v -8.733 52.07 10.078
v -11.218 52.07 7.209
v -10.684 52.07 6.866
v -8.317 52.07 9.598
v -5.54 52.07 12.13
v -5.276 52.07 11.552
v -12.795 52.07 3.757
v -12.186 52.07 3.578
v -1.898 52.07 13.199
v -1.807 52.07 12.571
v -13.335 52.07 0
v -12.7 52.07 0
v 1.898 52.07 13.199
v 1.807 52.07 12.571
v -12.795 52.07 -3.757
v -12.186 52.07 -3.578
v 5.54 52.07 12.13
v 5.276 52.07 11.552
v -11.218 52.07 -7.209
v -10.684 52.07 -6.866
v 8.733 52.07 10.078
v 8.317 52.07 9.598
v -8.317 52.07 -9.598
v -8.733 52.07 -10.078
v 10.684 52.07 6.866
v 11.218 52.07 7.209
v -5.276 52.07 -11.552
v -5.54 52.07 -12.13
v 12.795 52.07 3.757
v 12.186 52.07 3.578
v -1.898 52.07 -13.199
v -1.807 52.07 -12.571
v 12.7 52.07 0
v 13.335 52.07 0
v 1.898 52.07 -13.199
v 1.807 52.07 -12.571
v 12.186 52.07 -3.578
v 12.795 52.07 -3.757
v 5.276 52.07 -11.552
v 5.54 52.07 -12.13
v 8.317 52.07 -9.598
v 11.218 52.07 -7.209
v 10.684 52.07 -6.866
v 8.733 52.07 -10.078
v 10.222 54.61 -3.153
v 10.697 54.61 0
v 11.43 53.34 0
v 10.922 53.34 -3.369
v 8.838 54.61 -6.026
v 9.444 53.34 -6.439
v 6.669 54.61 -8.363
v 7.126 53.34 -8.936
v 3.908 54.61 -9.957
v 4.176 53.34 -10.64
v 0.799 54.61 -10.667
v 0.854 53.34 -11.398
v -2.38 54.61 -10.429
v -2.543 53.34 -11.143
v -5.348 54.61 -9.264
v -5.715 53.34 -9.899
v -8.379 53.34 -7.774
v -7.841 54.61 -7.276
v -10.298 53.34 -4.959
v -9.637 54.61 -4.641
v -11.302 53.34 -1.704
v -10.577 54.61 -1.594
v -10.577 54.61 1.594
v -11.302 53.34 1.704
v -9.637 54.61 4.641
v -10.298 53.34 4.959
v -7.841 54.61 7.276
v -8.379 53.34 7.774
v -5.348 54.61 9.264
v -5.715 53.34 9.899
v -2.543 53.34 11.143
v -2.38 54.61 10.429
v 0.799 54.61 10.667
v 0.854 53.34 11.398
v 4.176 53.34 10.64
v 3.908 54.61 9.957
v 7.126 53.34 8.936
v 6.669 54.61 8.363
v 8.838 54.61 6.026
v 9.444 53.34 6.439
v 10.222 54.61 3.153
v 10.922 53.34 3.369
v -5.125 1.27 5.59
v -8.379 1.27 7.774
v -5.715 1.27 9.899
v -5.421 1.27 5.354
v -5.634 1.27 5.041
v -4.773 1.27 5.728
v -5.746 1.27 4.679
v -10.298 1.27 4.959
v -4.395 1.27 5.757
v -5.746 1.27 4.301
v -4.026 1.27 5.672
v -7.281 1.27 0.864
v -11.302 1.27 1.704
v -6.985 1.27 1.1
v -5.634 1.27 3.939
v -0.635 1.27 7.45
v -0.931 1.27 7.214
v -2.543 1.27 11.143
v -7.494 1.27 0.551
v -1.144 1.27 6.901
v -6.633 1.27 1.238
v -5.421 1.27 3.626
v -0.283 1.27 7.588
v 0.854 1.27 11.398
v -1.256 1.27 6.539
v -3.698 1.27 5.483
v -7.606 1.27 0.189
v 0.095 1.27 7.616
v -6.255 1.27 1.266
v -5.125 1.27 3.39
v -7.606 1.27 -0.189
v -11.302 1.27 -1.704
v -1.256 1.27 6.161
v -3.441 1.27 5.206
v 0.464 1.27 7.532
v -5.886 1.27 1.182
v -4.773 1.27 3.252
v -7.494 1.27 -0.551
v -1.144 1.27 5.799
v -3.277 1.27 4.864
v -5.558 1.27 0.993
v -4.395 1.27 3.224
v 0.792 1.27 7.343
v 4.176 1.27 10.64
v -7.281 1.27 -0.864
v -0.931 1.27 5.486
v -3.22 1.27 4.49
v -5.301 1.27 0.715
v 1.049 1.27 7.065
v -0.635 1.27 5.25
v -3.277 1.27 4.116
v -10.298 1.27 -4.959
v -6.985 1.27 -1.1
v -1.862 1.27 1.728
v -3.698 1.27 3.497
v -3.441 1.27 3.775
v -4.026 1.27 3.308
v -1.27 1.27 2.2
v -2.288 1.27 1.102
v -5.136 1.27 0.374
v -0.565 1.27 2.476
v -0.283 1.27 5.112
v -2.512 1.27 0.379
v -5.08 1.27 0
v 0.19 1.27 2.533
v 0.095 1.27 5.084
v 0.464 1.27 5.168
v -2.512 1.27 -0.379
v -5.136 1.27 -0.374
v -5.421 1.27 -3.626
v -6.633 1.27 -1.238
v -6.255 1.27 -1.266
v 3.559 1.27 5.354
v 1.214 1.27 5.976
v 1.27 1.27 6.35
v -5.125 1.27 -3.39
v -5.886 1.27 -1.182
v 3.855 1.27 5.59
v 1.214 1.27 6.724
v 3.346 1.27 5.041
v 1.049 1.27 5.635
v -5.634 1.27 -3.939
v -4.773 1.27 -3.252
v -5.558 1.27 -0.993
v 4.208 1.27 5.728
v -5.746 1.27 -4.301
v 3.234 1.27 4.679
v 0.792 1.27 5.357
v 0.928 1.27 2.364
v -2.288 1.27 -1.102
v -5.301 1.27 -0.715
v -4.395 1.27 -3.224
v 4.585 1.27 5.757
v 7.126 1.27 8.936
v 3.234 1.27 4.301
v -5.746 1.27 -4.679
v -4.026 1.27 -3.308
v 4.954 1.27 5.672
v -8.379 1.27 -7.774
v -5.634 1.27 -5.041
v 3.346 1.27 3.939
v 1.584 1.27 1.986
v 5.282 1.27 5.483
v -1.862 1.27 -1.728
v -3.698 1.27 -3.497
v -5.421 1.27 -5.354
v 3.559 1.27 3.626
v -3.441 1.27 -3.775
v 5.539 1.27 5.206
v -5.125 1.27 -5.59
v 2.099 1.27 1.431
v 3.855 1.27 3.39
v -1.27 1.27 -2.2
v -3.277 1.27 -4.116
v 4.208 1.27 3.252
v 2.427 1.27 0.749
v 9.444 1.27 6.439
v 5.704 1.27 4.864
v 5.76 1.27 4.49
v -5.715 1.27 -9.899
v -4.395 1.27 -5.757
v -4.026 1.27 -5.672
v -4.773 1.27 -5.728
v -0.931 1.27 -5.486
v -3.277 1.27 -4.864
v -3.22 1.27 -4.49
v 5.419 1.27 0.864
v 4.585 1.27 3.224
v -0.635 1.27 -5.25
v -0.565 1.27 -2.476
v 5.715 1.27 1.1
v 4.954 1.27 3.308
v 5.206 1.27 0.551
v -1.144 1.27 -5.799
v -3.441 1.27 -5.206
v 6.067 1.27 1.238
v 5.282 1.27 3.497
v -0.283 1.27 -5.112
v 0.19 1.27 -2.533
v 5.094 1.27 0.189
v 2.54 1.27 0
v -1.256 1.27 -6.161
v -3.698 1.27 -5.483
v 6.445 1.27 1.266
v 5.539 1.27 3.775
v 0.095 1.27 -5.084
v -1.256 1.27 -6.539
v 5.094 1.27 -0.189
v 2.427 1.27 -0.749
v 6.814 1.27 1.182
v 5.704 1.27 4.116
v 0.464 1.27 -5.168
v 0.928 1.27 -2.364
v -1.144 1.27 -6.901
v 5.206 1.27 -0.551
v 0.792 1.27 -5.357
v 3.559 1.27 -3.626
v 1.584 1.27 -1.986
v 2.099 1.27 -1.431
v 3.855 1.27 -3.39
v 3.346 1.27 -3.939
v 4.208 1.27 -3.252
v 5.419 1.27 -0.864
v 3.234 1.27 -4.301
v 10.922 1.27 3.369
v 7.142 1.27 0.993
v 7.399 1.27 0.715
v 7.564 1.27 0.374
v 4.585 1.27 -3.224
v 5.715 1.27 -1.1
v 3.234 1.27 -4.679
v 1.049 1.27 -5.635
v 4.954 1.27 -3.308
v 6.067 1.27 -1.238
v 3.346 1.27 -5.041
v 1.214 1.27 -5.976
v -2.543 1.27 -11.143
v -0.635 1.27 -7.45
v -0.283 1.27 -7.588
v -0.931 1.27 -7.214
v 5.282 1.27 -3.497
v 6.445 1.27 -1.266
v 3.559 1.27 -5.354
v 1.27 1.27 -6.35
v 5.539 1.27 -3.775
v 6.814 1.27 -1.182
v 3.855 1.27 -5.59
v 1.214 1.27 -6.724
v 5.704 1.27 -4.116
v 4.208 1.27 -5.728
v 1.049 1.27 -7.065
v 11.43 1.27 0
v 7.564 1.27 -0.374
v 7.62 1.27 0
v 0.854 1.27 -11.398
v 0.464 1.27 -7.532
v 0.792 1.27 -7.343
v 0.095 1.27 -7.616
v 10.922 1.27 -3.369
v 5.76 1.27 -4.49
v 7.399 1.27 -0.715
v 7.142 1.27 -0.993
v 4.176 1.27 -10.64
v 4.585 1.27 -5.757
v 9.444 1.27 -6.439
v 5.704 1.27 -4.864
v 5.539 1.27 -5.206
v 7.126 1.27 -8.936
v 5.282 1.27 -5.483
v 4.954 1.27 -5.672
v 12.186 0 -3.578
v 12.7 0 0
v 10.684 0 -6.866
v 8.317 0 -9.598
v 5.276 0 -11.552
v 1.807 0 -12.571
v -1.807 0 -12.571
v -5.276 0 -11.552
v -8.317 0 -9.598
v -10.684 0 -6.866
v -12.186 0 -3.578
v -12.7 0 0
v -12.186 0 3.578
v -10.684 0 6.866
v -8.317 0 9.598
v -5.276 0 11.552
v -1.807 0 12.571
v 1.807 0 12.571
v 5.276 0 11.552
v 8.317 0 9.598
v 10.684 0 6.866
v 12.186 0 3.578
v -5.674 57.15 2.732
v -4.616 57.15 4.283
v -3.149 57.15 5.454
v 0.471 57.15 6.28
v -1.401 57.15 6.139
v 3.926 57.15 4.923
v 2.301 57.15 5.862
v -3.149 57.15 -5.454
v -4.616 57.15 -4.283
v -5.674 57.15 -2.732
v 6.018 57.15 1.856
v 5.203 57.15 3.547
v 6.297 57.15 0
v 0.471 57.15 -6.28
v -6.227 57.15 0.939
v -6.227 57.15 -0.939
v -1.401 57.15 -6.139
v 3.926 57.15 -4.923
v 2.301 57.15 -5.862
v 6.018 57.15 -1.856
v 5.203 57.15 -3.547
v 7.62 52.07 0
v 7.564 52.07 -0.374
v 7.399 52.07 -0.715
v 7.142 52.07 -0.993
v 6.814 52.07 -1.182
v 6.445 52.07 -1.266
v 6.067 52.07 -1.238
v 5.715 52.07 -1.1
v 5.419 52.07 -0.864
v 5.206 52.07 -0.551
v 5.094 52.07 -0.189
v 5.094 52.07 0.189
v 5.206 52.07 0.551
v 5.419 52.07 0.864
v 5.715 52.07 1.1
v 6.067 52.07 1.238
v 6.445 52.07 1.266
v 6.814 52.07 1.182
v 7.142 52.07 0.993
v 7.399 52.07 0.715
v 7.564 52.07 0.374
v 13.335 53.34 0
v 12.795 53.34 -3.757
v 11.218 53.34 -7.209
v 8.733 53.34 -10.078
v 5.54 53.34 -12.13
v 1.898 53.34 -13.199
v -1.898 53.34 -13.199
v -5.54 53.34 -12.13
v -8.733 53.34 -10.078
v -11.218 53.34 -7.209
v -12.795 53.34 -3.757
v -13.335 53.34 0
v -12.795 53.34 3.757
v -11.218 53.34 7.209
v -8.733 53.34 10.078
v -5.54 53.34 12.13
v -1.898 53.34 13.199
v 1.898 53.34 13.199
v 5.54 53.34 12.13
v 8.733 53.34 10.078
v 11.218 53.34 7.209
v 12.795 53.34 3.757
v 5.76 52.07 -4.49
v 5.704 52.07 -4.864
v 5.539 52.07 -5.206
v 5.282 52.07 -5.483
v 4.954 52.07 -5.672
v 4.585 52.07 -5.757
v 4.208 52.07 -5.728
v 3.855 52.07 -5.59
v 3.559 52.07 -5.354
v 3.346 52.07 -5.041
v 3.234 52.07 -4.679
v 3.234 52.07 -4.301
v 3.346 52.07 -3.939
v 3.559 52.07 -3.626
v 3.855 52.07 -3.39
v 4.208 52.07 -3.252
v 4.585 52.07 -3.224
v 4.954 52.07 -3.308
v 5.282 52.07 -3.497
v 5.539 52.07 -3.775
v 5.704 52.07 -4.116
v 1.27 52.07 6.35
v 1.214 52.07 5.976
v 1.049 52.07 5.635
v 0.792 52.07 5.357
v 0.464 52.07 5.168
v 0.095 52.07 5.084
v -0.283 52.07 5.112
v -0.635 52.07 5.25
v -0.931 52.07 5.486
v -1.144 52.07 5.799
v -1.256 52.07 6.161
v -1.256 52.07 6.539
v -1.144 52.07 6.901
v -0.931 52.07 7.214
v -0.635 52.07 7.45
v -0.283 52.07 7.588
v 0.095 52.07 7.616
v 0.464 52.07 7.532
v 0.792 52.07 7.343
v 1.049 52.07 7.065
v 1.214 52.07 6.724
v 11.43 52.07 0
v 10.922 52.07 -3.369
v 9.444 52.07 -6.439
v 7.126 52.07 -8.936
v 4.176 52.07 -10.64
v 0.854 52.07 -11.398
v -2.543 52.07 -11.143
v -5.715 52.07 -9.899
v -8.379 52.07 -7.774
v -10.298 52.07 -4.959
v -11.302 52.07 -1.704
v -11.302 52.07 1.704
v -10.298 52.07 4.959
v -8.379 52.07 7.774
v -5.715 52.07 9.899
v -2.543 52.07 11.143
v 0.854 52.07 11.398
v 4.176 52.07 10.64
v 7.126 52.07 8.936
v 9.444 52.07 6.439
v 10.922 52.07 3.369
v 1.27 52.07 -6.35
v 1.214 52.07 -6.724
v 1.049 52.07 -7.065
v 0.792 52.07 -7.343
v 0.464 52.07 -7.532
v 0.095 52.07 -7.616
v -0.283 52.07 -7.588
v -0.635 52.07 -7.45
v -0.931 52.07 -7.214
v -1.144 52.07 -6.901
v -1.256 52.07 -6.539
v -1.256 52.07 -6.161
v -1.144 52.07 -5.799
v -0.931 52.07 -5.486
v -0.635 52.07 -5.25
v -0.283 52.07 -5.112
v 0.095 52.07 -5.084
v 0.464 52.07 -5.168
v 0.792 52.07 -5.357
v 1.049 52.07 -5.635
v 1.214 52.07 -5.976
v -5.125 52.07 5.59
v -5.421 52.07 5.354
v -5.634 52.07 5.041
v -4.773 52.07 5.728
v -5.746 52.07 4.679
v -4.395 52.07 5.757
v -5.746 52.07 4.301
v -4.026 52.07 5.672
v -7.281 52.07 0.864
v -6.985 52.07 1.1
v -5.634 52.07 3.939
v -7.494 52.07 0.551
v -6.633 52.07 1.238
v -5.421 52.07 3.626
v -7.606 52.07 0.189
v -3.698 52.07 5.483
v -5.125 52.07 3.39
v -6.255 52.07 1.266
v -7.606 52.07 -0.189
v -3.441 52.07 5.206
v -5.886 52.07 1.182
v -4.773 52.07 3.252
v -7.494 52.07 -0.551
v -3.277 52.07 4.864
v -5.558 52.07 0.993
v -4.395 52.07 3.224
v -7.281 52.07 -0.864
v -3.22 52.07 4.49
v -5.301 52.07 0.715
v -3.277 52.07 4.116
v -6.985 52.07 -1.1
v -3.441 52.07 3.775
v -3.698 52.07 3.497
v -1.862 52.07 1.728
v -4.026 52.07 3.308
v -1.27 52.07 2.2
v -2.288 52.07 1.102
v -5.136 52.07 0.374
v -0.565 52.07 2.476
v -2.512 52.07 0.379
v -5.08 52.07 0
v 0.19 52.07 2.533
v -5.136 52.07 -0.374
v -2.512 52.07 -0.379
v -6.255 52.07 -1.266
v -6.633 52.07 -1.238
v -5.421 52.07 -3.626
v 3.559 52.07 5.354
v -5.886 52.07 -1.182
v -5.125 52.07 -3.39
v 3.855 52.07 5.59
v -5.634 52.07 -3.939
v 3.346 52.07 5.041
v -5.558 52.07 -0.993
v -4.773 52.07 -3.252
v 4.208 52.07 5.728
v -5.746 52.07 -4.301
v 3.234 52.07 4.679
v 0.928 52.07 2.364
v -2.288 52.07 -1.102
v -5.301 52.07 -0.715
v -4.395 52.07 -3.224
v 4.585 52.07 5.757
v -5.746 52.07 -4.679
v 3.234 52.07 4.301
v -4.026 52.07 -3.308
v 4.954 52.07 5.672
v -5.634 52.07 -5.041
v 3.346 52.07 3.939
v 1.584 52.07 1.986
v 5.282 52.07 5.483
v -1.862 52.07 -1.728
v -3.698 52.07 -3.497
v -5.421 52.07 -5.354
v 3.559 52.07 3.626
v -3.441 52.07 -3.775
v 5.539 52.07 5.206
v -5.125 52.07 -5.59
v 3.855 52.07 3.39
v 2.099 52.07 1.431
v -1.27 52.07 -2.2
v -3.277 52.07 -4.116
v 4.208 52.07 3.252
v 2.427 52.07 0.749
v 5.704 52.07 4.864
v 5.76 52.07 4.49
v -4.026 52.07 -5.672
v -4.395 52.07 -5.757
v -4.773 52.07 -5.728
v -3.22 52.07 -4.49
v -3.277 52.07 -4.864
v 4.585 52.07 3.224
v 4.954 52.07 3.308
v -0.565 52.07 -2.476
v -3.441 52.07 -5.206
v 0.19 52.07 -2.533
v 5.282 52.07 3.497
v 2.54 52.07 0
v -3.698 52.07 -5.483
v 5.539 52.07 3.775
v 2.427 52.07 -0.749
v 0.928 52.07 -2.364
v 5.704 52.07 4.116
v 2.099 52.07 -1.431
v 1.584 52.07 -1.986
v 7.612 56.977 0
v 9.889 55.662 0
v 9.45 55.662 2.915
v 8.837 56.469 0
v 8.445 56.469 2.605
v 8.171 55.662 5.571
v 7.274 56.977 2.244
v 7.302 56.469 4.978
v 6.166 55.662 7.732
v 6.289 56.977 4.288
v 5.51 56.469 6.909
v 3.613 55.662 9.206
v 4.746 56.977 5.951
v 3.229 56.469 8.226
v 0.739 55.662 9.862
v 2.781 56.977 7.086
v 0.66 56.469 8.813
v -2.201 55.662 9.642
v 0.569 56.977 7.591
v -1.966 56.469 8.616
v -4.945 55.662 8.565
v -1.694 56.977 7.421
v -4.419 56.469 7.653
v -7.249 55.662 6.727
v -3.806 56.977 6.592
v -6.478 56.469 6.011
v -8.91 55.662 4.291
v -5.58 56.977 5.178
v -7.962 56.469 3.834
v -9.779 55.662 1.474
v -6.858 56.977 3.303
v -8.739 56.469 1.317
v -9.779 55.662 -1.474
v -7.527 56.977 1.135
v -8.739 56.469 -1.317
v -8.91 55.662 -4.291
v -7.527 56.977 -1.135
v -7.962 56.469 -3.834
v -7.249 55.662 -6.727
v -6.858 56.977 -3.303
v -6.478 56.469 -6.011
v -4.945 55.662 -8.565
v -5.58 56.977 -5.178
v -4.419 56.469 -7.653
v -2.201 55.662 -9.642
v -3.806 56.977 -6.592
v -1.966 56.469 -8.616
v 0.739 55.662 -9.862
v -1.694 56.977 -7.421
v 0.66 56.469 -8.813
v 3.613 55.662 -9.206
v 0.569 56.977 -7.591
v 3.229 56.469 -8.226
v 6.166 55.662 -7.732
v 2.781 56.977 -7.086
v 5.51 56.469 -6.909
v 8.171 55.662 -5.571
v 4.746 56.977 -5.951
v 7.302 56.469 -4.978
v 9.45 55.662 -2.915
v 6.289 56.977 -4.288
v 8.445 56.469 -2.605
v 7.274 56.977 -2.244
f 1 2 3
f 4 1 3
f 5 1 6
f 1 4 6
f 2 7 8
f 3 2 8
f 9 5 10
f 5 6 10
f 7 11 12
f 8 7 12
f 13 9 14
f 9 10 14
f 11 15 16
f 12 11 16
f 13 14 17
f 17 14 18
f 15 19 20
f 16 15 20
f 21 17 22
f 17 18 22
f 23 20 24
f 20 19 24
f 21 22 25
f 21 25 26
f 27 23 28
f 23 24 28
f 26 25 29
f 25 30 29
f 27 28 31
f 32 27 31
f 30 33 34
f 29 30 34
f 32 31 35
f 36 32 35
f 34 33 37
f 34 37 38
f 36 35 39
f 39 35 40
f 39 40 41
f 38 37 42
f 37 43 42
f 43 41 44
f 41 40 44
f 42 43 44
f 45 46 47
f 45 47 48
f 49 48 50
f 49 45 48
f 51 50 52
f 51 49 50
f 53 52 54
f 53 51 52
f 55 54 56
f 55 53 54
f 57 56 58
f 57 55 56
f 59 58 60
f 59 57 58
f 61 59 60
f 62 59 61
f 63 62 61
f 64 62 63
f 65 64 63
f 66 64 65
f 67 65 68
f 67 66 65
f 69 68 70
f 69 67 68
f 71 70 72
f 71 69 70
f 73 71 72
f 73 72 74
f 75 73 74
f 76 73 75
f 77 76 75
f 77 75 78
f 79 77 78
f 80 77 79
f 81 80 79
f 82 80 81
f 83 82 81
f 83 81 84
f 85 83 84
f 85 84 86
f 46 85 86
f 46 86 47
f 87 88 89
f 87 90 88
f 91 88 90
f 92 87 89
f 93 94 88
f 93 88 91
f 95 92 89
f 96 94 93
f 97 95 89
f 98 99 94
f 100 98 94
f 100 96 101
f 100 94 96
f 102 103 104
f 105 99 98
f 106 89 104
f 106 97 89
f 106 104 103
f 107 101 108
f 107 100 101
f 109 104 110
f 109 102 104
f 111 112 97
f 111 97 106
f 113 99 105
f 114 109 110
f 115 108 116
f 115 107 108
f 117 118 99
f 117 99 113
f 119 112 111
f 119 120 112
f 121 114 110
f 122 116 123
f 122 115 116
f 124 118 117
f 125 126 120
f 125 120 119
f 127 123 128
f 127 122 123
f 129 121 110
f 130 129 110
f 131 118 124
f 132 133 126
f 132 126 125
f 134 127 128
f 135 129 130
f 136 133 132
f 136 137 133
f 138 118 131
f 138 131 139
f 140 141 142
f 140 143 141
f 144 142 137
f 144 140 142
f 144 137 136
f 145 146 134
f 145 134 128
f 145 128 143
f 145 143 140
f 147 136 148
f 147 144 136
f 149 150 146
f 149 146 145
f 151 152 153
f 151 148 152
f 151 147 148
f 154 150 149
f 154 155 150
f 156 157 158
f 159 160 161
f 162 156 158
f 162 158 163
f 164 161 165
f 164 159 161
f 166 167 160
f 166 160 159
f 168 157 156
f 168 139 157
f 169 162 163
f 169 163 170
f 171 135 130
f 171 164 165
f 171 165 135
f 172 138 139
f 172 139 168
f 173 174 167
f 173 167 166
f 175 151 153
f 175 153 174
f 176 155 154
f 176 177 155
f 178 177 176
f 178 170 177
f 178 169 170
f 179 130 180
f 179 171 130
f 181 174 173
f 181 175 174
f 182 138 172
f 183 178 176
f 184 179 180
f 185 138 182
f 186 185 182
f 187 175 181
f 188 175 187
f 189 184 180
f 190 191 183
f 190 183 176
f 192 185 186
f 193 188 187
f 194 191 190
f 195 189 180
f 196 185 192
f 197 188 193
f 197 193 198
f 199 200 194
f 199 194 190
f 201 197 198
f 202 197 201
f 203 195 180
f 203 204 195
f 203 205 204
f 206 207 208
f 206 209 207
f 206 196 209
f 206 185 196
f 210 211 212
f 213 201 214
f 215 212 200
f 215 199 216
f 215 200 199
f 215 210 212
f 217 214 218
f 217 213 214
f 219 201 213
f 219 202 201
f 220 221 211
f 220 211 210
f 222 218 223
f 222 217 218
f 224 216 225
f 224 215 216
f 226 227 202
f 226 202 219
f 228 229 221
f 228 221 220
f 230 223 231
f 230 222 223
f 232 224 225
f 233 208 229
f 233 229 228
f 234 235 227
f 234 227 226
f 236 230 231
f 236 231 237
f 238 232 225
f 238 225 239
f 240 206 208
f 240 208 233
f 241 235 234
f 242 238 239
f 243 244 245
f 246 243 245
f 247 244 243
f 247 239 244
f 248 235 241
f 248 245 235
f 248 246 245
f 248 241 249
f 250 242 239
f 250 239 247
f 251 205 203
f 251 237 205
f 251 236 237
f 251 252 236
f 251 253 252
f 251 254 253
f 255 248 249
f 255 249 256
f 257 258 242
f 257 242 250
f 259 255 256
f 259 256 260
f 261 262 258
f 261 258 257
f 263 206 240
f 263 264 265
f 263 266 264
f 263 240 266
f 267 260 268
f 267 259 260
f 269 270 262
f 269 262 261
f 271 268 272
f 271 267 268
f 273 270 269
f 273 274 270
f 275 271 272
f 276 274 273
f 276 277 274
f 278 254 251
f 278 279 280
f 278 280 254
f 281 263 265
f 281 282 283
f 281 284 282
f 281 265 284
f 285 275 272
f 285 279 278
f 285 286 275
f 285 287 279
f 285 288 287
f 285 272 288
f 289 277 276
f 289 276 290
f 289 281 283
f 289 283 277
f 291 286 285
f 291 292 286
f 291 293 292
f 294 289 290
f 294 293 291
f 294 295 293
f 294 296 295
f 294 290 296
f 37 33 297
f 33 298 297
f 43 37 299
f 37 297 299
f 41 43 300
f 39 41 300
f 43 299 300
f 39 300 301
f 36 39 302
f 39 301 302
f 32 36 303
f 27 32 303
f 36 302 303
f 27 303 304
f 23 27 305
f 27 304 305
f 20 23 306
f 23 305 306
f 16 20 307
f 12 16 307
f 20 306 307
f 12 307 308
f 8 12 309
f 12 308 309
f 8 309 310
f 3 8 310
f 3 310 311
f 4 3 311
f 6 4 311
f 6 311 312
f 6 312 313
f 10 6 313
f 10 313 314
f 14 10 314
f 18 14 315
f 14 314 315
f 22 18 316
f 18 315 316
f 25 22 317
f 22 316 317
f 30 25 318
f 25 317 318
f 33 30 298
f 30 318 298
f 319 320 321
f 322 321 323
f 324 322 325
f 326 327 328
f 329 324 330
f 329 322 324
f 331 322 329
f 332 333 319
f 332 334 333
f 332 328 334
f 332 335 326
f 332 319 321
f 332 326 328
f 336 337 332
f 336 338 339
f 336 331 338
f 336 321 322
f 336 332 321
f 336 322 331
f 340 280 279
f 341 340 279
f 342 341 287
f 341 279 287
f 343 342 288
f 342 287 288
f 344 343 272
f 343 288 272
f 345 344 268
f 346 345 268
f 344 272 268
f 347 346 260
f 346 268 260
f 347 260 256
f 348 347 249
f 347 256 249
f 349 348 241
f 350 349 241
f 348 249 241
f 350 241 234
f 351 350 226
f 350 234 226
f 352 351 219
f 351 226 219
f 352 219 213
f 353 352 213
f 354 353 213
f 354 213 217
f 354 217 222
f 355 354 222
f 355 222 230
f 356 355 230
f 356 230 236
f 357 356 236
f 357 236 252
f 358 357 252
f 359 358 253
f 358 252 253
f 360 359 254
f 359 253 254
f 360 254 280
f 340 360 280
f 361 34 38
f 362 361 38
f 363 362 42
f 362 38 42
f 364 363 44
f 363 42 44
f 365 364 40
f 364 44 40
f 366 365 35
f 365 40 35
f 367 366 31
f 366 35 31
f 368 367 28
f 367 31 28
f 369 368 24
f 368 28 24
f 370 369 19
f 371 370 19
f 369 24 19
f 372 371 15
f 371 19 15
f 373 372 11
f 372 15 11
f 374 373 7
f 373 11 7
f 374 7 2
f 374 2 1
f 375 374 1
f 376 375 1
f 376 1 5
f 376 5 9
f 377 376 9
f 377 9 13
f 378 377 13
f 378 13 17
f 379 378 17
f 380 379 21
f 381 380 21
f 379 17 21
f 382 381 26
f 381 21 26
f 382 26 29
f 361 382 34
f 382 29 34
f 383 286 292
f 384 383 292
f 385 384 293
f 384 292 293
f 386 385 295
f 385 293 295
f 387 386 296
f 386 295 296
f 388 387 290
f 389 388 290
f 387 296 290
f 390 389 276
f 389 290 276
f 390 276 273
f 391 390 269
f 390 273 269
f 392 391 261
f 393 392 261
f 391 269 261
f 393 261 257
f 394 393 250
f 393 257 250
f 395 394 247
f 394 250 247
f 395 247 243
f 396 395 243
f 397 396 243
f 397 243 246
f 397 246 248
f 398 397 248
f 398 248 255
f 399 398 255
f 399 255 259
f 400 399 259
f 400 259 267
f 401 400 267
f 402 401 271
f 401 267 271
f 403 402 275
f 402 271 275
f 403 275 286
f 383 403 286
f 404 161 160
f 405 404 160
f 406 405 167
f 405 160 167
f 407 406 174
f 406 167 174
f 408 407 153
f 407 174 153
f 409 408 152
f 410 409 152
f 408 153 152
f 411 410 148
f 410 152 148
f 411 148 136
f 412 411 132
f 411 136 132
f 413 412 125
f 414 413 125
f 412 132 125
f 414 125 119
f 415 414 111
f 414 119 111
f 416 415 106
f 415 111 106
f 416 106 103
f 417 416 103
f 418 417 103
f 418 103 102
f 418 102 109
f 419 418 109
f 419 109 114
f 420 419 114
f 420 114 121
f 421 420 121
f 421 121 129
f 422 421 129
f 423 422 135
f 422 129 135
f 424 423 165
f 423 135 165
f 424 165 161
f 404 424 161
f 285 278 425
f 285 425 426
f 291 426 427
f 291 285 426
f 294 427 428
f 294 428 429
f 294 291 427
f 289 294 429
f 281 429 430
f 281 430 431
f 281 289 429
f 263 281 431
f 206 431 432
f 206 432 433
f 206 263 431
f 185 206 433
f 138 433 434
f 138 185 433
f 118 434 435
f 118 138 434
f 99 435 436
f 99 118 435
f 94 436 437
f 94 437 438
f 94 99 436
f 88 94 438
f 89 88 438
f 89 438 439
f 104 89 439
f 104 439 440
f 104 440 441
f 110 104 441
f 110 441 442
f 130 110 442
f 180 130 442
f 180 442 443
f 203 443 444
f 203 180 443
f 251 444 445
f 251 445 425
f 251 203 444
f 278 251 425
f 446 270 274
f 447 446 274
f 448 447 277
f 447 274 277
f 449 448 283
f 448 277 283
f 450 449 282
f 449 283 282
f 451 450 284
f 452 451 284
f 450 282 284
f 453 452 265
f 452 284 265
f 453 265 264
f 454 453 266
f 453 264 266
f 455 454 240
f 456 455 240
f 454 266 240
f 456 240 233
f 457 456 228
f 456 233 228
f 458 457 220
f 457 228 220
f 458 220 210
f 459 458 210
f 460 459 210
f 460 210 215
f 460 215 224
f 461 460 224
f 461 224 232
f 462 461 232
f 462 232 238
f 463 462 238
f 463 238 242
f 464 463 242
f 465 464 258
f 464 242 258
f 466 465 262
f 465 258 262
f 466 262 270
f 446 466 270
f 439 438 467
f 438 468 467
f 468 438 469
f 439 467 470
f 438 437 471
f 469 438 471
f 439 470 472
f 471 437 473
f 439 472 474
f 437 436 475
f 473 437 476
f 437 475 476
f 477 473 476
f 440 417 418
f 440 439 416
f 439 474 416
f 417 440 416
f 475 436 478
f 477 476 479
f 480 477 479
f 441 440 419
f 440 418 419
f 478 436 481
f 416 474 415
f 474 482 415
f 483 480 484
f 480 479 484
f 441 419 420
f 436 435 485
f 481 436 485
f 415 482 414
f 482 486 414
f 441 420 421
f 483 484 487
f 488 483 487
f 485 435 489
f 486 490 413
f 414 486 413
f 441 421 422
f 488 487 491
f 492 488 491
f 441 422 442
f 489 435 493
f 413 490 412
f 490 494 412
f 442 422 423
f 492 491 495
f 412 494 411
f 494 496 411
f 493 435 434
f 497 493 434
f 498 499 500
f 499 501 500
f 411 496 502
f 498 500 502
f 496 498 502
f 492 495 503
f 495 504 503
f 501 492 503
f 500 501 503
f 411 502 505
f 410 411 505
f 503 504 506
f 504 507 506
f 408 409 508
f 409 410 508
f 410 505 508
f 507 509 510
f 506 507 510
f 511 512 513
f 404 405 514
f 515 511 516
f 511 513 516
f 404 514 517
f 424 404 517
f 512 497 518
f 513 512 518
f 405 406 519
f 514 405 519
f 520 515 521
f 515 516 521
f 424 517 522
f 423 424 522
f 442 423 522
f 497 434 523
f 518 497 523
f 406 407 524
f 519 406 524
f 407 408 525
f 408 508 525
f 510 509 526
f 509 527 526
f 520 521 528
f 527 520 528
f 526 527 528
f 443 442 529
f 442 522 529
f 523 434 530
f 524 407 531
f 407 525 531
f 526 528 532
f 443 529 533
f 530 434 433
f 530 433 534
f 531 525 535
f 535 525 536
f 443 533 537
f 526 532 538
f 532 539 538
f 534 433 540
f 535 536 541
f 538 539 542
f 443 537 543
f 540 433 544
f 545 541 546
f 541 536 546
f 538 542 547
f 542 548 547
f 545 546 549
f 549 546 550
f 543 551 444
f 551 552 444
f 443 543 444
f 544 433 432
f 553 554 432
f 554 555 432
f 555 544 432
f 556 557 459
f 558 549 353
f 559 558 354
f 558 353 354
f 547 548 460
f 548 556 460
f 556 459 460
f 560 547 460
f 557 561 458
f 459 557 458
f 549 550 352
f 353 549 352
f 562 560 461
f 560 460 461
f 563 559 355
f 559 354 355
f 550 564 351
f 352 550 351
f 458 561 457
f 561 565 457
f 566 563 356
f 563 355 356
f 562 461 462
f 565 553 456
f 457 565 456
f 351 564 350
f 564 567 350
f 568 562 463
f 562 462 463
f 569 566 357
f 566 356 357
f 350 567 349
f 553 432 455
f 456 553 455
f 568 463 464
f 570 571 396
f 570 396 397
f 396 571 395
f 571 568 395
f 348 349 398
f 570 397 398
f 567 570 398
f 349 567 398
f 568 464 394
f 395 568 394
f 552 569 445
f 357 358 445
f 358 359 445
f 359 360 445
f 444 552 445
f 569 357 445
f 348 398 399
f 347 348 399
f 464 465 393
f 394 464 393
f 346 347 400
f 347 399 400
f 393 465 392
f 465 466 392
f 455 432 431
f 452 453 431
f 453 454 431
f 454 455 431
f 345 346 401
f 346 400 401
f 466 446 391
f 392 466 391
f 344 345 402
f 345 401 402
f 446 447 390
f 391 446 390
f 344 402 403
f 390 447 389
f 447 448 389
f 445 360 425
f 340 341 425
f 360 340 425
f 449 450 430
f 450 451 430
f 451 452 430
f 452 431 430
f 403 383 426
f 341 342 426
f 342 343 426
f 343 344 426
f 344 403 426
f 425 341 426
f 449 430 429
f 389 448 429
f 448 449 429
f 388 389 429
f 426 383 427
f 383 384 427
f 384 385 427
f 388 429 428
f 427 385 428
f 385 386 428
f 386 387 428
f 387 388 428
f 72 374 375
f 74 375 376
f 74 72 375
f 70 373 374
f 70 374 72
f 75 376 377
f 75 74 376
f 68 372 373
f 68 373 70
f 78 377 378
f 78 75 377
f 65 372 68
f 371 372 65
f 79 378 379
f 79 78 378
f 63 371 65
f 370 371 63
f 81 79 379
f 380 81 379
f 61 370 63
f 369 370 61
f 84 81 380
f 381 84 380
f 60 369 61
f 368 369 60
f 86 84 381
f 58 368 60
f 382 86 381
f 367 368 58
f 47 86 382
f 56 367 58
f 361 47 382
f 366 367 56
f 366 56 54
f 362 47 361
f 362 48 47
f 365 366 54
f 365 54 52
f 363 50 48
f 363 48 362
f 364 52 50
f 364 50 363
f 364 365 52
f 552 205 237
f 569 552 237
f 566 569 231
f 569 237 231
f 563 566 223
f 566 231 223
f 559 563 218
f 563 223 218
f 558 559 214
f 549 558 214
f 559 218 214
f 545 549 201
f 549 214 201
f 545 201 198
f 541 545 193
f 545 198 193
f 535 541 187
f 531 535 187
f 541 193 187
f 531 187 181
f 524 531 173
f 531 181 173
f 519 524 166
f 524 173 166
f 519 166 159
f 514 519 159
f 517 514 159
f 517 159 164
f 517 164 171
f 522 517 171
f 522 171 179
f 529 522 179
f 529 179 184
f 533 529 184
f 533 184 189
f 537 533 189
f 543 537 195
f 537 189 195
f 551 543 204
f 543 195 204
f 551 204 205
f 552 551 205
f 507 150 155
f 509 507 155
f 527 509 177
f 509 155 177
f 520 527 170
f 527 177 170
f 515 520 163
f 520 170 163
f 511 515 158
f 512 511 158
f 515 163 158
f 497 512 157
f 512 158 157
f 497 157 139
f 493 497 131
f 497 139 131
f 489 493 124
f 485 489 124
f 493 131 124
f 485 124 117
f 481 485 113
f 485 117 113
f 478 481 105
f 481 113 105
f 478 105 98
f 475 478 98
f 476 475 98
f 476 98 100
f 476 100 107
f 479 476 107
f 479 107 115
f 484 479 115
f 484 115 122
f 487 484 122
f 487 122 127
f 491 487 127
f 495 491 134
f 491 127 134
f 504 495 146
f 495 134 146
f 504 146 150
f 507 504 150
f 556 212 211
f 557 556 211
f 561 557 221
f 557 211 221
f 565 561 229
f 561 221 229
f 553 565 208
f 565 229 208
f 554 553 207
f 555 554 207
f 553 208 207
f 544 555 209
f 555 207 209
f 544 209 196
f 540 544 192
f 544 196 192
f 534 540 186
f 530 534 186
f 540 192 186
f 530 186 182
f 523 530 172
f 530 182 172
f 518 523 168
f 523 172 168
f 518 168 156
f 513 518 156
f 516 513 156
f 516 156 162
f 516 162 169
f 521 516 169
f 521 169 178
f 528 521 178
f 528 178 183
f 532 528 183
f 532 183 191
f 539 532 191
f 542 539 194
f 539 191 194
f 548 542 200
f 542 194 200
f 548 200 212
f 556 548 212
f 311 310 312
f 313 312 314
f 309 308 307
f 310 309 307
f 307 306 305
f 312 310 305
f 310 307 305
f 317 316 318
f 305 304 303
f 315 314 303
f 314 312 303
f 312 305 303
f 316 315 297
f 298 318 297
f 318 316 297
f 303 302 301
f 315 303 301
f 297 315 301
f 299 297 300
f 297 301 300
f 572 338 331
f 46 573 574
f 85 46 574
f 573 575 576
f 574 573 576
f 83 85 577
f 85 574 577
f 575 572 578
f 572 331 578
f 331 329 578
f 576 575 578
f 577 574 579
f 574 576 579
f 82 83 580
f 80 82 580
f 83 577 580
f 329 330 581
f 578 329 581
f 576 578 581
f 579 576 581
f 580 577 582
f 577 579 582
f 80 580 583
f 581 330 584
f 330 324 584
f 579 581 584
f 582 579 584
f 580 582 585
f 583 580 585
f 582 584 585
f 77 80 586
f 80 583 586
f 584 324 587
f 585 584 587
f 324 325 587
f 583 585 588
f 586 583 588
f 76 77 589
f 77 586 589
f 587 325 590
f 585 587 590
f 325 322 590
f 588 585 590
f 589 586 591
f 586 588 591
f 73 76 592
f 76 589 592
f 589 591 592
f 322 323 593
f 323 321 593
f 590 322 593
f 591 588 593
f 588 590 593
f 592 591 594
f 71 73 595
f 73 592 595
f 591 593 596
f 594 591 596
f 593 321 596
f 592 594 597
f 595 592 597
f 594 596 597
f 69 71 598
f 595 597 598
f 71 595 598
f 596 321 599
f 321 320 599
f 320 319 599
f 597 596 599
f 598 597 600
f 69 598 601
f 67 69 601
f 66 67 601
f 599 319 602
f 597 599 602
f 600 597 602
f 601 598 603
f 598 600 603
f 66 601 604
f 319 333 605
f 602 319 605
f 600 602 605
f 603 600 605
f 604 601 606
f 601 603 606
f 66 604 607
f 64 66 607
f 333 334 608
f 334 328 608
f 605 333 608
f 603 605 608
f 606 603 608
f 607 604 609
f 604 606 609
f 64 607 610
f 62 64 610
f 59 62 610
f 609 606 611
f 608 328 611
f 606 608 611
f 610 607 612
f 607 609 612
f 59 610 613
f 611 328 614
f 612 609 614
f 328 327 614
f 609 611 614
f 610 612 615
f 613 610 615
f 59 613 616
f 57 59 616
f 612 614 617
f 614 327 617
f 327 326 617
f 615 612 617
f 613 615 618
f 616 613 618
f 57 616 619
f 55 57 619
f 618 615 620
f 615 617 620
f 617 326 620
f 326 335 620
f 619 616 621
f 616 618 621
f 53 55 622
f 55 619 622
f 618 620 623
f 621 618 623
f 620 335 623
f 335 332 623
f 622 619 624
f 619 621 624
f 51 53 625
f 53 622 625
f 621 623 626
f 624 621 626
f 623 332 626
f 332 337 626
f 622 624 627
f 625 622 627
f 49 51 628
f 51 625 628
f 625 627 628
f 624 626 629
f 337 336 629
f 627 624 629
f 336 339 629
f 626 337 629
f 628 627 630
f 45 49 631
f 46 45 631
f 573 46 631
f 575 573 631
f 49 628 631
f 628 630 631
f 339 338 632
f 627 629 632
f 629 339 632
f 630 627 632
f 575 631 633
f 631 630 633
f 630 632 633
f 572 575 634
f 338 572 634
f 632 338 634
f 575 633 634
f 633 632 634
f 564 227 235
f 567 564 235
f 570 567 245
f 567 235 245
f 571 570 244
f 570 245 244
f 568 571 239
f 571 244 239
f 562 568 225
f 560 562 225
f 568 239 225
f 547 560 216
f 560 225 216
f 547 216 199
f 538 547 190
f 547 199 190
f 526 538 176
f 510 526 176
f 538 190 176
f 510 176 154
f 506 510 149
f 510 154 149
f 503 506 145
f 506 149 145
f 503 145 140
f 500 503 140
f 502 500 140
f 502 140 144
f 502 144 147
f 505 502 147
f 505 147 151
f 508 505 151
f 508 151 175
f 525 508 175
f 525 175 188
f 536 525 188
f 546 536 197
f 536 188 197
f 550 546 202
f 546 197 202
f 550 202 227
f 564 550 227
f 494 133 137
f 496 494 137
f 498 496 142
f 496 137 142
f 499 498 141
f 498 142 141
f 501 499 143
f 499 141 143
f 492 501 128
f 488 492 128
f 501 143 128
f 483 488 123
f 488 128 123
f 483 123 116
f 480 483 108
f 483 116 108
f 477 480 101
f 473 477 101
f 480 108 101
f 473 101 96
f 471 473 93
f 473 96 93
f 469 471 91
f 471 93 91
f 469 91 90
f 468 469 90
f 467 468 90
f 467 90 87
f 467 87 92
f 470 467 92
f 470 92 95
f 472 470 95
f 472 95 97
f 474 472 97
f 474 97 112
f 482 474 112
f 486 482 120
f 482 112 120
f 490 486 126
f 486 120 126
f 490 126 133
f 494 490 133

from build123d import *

# Parameters (mm, degrees)
SKETCH1_R           = 12.7
BOSS_EXTRUDE1_DEPTH = 1.27
SKETCH2_R           = 12.7
SKETCH2_R_2         = 11.43
SKETCH2_R_3         = 1.27
SKETCH2_R_4         = 2.54
BOSS_EXTRUDE2_DEPTH = 50.8
SKETCH3_R           = 13.335
BOSS_EXTRUDE3_DEPTH = 1.27
SKETCH4_R           = 11.43
BOSS_EXTRUDE4_DEPTH = 3.81
BOSS_EXTRUDE4_TAPER = 30
FILLET1_R           = 5.08


with BuildPart() as part:
    # Sketch1 → Boss-Extrude1 (new body)
    with BuildSketch(Plane(origin=(0, 0, 0), x_dir=(1, 0, 0), z_dir=(0, 1, 0))):
        Circle(SKETCH1_R)
    extrude(amount=BOSS_EXTRUDE1_DEPTH)

    # Sketch2 → Boss-Extrude2 (add)
    with BuildSketch(Plane(origin=(0, 1.27, 0), x_dir=(1, 0, 0), z_dir=(0, 1, 0))):
        Circle(SKETCH2_R)
        Circle(SKETCH2_R_2, mode=Mode.SUBTRACT)
        with Locations((-6.35, 0)):
            Circle(SKETCH2_R_3)
        with Locations((-4.490128061, 4.490128061)):
            Circle(SKETCH2_R_3)
        with Locations((-4.490128061, -4.490128061)):
            Circle(SKETCH2_R_3)
        Circle(SKETCH2_R_4)
        with Locations((0, 6.35)):
            Circle(SKETCH2_R_3)
        with Locations((4.490128061, 4.490128061)):
            Circle(SKETCH2_R_3)
        with Locations((6.35, 0)):
            Circle(SKETCH2_R_3)
        with Locations((4.490128061, -4.490128061)):
            Circle(SKETCH2_R_3)
        with Locations((0, -6.35)):
            Circle(SKETCH2_R_3)
    extrude(amount=BOSS_EXTRUDE2_DEPTH)

    # Sketch3 → Boss-Extrude3 (add)
    with BuildSketch(Plane(origin=(0, 52.07, 0), x_dir=(1, 0, 0), z_dir=(0, 1, 0))):
        Circle(SKETCH3_R)
    extrude(amount=BOSS_EXTRUDE3_DEPTH)

    # Sketch4 → Boss-Extrude4 (add)
    with BuildSketch(Plane(origin=(0, 53.34, 0), x_dir=(1, 0, 0), z_dir=(0, 1, 0))):
        Circle(SKETCH4_R)
    extrude(amount=BOSS_EXTRUDE4_DEPTH, taper=BOSS_EXTRUDE4_TAPER)

    # Fillet1
    fillet1_edges = [part.edges().sort_by_distance(p)[0] for p in [
        (-9.230295474, 57.15, 0),
    ]]
    fillet(fillet1_edges, radius=FILLET1_R)


solid = part.part
